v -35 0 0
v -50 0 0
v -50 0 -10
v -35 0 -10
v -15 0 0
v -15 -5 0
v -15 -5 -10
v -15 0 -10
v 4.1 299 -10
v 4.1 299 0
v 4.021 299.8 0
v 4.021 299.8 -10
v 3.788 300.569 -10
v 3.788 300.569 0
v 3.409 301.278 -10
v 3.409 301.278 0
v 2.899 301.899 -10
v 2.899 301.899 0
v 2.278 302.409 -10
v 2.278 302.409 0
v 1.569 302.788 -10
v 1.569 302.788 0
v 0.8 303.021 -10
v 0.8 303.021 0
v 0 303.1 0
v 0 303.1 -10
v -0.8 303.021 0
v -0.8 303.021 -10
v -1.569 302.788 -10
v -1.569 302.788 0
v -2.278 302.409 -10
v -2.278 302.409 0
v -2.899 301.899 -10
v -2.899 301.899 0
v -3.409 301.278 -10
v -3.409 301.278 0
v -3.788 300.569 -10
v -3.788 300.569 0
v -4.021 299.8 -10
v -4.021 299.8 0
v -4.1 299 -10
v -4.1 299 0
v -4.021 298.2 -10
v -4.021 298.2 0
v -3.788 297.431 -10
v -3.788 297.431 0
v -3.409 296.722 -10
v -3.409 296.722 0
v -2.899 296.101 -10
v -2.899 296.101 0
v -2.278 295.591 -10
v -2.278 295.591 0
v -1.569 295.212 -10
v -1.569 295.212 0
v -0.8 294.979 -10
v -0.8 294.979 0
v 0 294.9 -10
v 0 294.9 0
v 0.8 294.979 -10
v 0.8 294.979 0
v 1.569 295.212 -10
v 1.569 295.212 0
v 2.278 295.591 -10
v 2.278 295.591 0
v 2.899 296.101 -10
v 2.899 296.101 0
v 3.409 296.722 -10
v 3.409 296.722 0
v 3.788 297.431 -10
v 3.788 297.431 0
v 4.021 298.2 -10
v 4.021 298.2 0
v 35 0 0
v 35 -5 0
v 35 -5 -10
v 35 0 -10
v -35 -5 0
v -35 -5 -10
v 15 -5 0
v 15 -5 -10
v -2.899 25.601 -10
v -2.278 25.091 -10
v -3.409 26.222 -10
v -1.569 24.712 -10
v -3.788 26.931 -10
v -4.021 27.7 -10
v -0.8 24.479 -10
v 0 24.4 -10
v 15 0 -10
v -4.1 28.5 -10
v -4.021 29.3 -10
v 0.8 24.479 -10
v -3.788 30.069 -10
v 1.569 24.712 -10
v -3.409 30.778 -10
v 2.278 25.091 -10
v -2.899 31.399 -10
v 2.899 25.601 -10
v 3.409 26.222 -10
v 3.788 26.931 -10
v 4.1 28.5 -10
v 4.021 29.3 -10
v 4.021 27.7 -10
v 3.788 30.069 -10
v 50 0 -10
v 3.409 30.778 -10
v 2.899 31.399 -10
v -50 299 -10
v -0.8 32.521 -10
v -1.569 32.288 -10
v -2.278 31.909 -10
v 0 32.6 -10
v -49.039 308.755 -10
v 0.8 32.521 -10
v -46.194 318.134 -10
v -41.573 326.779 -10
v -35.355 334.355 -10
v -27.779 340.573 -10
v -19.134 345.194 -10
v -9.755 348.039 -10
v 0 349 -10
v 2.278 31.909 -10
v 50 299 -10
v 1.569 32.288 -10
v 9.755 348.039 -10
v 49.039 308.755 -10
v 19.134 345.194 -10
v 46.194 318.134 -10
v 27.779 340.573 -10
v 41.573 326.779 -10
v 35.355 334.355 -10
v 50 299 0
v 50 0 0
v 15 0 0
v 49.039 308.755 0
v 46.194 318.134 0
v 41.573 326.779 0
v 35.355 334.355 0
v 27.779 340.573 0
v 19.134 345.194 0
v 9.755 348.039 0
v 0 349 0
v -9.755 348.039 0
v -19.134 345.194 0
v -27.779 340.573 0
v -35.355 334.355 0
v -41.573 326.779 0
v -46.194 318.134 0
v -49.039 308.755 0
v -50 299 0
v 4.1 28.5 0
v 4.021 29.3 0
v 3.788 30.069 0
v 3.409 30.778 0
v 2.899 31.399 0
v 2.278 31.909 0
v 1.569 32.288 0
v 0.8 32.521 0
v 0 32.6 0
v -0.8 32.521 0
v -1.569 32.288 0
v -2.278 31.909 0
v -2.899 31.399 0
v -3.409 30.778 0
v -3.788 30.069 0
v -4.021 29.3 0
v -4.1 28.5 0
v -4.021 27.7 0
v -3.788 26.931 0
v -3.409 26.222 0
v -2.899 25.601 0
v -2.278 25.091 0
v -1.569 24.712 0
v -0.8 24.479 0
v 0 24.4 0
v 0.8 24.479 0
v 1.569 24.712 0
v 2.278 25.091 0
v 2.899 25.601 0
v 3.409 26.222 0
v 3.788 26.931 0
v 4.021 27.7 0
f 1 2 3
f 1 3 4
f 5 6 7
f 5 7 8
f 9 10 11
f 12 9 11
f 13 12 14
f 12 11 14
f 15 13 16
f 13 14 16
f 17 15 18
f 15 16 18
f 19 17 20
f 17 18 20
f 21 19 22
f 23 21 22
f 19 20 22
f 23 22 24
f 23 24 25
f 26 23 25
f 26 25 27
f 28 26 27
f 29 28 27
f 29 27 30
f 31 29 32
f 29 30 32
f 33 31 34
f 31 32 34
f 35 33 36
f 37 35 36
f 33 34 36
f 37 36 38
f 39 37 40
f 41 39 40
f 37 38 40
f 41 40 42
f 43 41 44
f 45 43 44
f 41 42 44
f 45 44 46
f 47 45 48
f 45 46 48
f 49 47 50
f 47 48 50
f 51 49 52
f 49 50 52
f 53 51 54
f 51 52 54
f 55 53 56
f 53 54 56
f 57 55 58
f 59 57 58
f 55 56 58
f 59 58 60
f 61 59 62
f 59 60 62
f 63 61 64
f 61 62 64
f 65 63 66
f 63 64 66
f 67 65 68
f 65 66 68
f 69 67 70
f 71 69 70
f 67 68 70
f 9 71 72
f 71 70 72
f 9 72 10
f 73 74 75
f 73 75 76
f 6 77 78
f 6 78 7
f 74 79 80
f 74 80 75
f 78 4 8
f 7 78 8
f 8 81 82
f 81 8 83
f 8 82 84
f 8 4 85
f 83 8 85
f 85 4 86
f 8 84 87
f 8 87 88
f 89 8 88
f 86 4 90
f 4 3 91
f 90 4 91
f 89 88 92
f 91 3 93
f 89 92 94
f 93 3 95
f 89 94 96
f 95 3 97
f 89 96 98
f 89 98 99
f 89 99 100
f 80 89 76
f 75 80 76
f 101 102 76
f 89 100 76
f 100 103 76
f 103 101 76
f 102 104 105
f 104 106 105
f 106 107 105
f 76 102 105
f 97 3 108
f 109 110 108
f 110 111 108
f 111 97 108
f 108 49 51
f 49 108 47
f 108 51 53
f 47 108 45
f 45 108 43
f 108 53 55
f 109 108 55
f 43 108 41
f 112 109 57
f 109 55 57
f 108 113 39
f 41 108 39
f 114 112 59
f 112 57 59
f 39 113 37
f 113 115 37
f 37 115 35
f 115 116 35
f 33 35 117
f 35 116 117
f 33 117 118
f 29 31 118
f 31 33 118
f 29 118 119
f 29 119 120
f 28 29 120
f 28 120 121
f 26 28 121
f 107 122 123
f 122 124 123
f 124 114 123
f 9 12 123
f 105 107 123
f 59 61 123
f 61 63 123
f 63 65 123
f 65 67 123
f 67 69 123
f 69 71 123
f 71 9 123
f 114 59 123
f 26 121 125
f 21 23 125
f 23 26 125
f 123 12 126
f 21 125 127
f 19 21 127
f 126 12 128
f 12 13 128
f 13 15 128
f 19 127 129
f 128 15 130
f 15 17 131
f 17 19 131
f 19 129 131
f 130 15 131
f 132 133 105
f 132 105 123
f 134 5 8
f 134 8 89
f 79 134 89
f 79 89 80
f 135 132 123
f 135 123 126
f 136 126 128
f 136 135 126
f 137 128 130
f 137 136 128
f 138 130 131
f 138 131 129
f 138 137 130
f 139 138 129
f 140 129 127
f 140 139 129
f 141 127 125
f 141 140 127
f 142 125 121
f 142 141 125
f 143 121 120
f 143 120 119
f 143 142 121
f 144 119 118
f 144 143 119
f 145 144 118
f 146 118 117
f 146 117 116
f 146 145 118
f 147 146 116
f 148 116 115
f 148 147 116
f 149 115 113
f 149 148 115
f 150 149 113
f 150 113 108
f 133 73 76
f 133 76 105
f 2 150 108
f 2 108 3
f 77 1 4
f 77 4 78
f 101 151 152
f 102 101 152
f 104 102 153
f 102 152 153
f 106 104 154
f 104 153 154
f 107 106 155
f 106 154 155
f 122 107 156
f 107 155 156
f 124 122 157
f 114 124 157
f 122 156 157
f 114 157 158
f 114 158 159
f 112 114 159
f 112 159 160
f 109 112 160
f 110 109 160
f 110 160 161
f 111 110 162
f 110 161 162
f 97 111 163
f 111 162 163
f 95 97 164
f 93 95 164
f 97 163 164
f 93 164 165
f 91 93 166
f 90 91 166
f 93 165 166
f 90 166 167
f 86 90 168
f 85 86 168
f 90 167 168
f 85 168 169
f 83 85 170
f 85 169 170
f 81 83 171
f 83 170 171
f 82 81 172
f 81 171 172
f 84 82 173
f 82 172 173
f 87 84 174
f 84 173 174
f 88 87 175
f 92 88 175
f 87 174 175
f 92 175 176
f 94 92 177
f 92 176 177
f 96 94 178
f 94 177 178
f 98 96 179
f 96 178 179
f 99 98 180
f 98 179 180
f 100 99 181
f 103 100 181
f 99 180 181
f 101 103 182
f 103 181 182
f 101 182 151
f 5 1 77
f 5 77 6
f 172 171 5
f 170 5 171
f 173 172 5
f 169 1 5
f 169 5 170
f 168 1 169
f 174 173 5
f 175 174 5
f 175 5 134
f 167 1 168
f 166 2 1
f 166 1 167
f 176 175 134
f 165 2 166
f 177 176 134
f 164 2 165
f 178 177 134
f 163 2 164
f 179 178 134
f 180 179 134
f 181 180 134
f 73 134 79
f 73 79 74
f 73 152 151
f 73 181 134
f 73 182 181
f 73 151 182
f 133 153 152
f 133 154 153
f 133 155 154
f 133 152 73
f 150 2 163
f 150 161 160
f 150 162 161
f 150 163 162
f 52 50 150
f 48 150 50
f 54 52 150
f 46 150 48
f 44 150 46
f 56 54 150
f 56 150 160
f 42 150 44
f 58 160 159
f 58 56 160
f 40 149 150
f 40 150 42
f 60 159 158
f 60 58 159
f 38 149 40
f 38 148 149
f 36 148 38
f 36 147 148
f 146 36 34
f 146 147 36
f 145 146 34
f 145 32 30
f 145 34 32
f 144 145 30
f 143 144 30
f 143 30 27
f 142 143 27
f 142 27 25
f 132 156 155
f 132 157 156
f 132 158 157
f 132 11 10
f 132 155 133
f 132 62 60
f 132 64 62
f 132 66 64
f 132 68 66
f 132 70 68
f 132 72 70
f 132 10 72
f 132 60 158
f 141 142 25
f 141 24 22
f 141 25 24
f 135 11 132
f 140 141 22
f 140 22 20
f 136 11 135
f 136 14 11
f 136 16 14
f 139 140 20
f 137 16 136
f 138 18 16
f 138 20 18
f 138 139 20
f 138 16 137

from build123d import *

# Parameters (mm, degrees)
SKETCH_1_R      = 4.1
EXTRUDE_1_DEPTH = 10


with BuildPart() as part:
    # 草圖1 → 填料-伸長1 (new body)
    with BuildSketch(Plane.XY):
        with BuildLine():
            Line((-50, 0), (-35, 0))
            Line((-35, 0), (-35, -5))
            Line((-35, -5), (-15, -5))
            Line((-15, -5), (-15, 0))
            Line((-15, 0), (15, 0))
            Line((15, 0), (15, -5))
            Line((15, -5), (35, -5))
            Line((35, -5), (35, 0))
            Line((35, 0), (50, 0))
            Line((50, 0), (50, 299))
            ThreePointArc((50, 299), (0, 349), (-50, 299))
            Line((-50, 299), (-50, 0))
        make_face()
        with Locations((0, 299)):
            Circle(SKETCH_1_R, mode=Mode.SUBTRACT)
        with Locations((0, 28.5)):
            Circle(SKETCH_1_R, mode=Mode.SUBTRACT)
    extrude(amount=-EXTRUDE_1_DEPTH)


solid = part.part
